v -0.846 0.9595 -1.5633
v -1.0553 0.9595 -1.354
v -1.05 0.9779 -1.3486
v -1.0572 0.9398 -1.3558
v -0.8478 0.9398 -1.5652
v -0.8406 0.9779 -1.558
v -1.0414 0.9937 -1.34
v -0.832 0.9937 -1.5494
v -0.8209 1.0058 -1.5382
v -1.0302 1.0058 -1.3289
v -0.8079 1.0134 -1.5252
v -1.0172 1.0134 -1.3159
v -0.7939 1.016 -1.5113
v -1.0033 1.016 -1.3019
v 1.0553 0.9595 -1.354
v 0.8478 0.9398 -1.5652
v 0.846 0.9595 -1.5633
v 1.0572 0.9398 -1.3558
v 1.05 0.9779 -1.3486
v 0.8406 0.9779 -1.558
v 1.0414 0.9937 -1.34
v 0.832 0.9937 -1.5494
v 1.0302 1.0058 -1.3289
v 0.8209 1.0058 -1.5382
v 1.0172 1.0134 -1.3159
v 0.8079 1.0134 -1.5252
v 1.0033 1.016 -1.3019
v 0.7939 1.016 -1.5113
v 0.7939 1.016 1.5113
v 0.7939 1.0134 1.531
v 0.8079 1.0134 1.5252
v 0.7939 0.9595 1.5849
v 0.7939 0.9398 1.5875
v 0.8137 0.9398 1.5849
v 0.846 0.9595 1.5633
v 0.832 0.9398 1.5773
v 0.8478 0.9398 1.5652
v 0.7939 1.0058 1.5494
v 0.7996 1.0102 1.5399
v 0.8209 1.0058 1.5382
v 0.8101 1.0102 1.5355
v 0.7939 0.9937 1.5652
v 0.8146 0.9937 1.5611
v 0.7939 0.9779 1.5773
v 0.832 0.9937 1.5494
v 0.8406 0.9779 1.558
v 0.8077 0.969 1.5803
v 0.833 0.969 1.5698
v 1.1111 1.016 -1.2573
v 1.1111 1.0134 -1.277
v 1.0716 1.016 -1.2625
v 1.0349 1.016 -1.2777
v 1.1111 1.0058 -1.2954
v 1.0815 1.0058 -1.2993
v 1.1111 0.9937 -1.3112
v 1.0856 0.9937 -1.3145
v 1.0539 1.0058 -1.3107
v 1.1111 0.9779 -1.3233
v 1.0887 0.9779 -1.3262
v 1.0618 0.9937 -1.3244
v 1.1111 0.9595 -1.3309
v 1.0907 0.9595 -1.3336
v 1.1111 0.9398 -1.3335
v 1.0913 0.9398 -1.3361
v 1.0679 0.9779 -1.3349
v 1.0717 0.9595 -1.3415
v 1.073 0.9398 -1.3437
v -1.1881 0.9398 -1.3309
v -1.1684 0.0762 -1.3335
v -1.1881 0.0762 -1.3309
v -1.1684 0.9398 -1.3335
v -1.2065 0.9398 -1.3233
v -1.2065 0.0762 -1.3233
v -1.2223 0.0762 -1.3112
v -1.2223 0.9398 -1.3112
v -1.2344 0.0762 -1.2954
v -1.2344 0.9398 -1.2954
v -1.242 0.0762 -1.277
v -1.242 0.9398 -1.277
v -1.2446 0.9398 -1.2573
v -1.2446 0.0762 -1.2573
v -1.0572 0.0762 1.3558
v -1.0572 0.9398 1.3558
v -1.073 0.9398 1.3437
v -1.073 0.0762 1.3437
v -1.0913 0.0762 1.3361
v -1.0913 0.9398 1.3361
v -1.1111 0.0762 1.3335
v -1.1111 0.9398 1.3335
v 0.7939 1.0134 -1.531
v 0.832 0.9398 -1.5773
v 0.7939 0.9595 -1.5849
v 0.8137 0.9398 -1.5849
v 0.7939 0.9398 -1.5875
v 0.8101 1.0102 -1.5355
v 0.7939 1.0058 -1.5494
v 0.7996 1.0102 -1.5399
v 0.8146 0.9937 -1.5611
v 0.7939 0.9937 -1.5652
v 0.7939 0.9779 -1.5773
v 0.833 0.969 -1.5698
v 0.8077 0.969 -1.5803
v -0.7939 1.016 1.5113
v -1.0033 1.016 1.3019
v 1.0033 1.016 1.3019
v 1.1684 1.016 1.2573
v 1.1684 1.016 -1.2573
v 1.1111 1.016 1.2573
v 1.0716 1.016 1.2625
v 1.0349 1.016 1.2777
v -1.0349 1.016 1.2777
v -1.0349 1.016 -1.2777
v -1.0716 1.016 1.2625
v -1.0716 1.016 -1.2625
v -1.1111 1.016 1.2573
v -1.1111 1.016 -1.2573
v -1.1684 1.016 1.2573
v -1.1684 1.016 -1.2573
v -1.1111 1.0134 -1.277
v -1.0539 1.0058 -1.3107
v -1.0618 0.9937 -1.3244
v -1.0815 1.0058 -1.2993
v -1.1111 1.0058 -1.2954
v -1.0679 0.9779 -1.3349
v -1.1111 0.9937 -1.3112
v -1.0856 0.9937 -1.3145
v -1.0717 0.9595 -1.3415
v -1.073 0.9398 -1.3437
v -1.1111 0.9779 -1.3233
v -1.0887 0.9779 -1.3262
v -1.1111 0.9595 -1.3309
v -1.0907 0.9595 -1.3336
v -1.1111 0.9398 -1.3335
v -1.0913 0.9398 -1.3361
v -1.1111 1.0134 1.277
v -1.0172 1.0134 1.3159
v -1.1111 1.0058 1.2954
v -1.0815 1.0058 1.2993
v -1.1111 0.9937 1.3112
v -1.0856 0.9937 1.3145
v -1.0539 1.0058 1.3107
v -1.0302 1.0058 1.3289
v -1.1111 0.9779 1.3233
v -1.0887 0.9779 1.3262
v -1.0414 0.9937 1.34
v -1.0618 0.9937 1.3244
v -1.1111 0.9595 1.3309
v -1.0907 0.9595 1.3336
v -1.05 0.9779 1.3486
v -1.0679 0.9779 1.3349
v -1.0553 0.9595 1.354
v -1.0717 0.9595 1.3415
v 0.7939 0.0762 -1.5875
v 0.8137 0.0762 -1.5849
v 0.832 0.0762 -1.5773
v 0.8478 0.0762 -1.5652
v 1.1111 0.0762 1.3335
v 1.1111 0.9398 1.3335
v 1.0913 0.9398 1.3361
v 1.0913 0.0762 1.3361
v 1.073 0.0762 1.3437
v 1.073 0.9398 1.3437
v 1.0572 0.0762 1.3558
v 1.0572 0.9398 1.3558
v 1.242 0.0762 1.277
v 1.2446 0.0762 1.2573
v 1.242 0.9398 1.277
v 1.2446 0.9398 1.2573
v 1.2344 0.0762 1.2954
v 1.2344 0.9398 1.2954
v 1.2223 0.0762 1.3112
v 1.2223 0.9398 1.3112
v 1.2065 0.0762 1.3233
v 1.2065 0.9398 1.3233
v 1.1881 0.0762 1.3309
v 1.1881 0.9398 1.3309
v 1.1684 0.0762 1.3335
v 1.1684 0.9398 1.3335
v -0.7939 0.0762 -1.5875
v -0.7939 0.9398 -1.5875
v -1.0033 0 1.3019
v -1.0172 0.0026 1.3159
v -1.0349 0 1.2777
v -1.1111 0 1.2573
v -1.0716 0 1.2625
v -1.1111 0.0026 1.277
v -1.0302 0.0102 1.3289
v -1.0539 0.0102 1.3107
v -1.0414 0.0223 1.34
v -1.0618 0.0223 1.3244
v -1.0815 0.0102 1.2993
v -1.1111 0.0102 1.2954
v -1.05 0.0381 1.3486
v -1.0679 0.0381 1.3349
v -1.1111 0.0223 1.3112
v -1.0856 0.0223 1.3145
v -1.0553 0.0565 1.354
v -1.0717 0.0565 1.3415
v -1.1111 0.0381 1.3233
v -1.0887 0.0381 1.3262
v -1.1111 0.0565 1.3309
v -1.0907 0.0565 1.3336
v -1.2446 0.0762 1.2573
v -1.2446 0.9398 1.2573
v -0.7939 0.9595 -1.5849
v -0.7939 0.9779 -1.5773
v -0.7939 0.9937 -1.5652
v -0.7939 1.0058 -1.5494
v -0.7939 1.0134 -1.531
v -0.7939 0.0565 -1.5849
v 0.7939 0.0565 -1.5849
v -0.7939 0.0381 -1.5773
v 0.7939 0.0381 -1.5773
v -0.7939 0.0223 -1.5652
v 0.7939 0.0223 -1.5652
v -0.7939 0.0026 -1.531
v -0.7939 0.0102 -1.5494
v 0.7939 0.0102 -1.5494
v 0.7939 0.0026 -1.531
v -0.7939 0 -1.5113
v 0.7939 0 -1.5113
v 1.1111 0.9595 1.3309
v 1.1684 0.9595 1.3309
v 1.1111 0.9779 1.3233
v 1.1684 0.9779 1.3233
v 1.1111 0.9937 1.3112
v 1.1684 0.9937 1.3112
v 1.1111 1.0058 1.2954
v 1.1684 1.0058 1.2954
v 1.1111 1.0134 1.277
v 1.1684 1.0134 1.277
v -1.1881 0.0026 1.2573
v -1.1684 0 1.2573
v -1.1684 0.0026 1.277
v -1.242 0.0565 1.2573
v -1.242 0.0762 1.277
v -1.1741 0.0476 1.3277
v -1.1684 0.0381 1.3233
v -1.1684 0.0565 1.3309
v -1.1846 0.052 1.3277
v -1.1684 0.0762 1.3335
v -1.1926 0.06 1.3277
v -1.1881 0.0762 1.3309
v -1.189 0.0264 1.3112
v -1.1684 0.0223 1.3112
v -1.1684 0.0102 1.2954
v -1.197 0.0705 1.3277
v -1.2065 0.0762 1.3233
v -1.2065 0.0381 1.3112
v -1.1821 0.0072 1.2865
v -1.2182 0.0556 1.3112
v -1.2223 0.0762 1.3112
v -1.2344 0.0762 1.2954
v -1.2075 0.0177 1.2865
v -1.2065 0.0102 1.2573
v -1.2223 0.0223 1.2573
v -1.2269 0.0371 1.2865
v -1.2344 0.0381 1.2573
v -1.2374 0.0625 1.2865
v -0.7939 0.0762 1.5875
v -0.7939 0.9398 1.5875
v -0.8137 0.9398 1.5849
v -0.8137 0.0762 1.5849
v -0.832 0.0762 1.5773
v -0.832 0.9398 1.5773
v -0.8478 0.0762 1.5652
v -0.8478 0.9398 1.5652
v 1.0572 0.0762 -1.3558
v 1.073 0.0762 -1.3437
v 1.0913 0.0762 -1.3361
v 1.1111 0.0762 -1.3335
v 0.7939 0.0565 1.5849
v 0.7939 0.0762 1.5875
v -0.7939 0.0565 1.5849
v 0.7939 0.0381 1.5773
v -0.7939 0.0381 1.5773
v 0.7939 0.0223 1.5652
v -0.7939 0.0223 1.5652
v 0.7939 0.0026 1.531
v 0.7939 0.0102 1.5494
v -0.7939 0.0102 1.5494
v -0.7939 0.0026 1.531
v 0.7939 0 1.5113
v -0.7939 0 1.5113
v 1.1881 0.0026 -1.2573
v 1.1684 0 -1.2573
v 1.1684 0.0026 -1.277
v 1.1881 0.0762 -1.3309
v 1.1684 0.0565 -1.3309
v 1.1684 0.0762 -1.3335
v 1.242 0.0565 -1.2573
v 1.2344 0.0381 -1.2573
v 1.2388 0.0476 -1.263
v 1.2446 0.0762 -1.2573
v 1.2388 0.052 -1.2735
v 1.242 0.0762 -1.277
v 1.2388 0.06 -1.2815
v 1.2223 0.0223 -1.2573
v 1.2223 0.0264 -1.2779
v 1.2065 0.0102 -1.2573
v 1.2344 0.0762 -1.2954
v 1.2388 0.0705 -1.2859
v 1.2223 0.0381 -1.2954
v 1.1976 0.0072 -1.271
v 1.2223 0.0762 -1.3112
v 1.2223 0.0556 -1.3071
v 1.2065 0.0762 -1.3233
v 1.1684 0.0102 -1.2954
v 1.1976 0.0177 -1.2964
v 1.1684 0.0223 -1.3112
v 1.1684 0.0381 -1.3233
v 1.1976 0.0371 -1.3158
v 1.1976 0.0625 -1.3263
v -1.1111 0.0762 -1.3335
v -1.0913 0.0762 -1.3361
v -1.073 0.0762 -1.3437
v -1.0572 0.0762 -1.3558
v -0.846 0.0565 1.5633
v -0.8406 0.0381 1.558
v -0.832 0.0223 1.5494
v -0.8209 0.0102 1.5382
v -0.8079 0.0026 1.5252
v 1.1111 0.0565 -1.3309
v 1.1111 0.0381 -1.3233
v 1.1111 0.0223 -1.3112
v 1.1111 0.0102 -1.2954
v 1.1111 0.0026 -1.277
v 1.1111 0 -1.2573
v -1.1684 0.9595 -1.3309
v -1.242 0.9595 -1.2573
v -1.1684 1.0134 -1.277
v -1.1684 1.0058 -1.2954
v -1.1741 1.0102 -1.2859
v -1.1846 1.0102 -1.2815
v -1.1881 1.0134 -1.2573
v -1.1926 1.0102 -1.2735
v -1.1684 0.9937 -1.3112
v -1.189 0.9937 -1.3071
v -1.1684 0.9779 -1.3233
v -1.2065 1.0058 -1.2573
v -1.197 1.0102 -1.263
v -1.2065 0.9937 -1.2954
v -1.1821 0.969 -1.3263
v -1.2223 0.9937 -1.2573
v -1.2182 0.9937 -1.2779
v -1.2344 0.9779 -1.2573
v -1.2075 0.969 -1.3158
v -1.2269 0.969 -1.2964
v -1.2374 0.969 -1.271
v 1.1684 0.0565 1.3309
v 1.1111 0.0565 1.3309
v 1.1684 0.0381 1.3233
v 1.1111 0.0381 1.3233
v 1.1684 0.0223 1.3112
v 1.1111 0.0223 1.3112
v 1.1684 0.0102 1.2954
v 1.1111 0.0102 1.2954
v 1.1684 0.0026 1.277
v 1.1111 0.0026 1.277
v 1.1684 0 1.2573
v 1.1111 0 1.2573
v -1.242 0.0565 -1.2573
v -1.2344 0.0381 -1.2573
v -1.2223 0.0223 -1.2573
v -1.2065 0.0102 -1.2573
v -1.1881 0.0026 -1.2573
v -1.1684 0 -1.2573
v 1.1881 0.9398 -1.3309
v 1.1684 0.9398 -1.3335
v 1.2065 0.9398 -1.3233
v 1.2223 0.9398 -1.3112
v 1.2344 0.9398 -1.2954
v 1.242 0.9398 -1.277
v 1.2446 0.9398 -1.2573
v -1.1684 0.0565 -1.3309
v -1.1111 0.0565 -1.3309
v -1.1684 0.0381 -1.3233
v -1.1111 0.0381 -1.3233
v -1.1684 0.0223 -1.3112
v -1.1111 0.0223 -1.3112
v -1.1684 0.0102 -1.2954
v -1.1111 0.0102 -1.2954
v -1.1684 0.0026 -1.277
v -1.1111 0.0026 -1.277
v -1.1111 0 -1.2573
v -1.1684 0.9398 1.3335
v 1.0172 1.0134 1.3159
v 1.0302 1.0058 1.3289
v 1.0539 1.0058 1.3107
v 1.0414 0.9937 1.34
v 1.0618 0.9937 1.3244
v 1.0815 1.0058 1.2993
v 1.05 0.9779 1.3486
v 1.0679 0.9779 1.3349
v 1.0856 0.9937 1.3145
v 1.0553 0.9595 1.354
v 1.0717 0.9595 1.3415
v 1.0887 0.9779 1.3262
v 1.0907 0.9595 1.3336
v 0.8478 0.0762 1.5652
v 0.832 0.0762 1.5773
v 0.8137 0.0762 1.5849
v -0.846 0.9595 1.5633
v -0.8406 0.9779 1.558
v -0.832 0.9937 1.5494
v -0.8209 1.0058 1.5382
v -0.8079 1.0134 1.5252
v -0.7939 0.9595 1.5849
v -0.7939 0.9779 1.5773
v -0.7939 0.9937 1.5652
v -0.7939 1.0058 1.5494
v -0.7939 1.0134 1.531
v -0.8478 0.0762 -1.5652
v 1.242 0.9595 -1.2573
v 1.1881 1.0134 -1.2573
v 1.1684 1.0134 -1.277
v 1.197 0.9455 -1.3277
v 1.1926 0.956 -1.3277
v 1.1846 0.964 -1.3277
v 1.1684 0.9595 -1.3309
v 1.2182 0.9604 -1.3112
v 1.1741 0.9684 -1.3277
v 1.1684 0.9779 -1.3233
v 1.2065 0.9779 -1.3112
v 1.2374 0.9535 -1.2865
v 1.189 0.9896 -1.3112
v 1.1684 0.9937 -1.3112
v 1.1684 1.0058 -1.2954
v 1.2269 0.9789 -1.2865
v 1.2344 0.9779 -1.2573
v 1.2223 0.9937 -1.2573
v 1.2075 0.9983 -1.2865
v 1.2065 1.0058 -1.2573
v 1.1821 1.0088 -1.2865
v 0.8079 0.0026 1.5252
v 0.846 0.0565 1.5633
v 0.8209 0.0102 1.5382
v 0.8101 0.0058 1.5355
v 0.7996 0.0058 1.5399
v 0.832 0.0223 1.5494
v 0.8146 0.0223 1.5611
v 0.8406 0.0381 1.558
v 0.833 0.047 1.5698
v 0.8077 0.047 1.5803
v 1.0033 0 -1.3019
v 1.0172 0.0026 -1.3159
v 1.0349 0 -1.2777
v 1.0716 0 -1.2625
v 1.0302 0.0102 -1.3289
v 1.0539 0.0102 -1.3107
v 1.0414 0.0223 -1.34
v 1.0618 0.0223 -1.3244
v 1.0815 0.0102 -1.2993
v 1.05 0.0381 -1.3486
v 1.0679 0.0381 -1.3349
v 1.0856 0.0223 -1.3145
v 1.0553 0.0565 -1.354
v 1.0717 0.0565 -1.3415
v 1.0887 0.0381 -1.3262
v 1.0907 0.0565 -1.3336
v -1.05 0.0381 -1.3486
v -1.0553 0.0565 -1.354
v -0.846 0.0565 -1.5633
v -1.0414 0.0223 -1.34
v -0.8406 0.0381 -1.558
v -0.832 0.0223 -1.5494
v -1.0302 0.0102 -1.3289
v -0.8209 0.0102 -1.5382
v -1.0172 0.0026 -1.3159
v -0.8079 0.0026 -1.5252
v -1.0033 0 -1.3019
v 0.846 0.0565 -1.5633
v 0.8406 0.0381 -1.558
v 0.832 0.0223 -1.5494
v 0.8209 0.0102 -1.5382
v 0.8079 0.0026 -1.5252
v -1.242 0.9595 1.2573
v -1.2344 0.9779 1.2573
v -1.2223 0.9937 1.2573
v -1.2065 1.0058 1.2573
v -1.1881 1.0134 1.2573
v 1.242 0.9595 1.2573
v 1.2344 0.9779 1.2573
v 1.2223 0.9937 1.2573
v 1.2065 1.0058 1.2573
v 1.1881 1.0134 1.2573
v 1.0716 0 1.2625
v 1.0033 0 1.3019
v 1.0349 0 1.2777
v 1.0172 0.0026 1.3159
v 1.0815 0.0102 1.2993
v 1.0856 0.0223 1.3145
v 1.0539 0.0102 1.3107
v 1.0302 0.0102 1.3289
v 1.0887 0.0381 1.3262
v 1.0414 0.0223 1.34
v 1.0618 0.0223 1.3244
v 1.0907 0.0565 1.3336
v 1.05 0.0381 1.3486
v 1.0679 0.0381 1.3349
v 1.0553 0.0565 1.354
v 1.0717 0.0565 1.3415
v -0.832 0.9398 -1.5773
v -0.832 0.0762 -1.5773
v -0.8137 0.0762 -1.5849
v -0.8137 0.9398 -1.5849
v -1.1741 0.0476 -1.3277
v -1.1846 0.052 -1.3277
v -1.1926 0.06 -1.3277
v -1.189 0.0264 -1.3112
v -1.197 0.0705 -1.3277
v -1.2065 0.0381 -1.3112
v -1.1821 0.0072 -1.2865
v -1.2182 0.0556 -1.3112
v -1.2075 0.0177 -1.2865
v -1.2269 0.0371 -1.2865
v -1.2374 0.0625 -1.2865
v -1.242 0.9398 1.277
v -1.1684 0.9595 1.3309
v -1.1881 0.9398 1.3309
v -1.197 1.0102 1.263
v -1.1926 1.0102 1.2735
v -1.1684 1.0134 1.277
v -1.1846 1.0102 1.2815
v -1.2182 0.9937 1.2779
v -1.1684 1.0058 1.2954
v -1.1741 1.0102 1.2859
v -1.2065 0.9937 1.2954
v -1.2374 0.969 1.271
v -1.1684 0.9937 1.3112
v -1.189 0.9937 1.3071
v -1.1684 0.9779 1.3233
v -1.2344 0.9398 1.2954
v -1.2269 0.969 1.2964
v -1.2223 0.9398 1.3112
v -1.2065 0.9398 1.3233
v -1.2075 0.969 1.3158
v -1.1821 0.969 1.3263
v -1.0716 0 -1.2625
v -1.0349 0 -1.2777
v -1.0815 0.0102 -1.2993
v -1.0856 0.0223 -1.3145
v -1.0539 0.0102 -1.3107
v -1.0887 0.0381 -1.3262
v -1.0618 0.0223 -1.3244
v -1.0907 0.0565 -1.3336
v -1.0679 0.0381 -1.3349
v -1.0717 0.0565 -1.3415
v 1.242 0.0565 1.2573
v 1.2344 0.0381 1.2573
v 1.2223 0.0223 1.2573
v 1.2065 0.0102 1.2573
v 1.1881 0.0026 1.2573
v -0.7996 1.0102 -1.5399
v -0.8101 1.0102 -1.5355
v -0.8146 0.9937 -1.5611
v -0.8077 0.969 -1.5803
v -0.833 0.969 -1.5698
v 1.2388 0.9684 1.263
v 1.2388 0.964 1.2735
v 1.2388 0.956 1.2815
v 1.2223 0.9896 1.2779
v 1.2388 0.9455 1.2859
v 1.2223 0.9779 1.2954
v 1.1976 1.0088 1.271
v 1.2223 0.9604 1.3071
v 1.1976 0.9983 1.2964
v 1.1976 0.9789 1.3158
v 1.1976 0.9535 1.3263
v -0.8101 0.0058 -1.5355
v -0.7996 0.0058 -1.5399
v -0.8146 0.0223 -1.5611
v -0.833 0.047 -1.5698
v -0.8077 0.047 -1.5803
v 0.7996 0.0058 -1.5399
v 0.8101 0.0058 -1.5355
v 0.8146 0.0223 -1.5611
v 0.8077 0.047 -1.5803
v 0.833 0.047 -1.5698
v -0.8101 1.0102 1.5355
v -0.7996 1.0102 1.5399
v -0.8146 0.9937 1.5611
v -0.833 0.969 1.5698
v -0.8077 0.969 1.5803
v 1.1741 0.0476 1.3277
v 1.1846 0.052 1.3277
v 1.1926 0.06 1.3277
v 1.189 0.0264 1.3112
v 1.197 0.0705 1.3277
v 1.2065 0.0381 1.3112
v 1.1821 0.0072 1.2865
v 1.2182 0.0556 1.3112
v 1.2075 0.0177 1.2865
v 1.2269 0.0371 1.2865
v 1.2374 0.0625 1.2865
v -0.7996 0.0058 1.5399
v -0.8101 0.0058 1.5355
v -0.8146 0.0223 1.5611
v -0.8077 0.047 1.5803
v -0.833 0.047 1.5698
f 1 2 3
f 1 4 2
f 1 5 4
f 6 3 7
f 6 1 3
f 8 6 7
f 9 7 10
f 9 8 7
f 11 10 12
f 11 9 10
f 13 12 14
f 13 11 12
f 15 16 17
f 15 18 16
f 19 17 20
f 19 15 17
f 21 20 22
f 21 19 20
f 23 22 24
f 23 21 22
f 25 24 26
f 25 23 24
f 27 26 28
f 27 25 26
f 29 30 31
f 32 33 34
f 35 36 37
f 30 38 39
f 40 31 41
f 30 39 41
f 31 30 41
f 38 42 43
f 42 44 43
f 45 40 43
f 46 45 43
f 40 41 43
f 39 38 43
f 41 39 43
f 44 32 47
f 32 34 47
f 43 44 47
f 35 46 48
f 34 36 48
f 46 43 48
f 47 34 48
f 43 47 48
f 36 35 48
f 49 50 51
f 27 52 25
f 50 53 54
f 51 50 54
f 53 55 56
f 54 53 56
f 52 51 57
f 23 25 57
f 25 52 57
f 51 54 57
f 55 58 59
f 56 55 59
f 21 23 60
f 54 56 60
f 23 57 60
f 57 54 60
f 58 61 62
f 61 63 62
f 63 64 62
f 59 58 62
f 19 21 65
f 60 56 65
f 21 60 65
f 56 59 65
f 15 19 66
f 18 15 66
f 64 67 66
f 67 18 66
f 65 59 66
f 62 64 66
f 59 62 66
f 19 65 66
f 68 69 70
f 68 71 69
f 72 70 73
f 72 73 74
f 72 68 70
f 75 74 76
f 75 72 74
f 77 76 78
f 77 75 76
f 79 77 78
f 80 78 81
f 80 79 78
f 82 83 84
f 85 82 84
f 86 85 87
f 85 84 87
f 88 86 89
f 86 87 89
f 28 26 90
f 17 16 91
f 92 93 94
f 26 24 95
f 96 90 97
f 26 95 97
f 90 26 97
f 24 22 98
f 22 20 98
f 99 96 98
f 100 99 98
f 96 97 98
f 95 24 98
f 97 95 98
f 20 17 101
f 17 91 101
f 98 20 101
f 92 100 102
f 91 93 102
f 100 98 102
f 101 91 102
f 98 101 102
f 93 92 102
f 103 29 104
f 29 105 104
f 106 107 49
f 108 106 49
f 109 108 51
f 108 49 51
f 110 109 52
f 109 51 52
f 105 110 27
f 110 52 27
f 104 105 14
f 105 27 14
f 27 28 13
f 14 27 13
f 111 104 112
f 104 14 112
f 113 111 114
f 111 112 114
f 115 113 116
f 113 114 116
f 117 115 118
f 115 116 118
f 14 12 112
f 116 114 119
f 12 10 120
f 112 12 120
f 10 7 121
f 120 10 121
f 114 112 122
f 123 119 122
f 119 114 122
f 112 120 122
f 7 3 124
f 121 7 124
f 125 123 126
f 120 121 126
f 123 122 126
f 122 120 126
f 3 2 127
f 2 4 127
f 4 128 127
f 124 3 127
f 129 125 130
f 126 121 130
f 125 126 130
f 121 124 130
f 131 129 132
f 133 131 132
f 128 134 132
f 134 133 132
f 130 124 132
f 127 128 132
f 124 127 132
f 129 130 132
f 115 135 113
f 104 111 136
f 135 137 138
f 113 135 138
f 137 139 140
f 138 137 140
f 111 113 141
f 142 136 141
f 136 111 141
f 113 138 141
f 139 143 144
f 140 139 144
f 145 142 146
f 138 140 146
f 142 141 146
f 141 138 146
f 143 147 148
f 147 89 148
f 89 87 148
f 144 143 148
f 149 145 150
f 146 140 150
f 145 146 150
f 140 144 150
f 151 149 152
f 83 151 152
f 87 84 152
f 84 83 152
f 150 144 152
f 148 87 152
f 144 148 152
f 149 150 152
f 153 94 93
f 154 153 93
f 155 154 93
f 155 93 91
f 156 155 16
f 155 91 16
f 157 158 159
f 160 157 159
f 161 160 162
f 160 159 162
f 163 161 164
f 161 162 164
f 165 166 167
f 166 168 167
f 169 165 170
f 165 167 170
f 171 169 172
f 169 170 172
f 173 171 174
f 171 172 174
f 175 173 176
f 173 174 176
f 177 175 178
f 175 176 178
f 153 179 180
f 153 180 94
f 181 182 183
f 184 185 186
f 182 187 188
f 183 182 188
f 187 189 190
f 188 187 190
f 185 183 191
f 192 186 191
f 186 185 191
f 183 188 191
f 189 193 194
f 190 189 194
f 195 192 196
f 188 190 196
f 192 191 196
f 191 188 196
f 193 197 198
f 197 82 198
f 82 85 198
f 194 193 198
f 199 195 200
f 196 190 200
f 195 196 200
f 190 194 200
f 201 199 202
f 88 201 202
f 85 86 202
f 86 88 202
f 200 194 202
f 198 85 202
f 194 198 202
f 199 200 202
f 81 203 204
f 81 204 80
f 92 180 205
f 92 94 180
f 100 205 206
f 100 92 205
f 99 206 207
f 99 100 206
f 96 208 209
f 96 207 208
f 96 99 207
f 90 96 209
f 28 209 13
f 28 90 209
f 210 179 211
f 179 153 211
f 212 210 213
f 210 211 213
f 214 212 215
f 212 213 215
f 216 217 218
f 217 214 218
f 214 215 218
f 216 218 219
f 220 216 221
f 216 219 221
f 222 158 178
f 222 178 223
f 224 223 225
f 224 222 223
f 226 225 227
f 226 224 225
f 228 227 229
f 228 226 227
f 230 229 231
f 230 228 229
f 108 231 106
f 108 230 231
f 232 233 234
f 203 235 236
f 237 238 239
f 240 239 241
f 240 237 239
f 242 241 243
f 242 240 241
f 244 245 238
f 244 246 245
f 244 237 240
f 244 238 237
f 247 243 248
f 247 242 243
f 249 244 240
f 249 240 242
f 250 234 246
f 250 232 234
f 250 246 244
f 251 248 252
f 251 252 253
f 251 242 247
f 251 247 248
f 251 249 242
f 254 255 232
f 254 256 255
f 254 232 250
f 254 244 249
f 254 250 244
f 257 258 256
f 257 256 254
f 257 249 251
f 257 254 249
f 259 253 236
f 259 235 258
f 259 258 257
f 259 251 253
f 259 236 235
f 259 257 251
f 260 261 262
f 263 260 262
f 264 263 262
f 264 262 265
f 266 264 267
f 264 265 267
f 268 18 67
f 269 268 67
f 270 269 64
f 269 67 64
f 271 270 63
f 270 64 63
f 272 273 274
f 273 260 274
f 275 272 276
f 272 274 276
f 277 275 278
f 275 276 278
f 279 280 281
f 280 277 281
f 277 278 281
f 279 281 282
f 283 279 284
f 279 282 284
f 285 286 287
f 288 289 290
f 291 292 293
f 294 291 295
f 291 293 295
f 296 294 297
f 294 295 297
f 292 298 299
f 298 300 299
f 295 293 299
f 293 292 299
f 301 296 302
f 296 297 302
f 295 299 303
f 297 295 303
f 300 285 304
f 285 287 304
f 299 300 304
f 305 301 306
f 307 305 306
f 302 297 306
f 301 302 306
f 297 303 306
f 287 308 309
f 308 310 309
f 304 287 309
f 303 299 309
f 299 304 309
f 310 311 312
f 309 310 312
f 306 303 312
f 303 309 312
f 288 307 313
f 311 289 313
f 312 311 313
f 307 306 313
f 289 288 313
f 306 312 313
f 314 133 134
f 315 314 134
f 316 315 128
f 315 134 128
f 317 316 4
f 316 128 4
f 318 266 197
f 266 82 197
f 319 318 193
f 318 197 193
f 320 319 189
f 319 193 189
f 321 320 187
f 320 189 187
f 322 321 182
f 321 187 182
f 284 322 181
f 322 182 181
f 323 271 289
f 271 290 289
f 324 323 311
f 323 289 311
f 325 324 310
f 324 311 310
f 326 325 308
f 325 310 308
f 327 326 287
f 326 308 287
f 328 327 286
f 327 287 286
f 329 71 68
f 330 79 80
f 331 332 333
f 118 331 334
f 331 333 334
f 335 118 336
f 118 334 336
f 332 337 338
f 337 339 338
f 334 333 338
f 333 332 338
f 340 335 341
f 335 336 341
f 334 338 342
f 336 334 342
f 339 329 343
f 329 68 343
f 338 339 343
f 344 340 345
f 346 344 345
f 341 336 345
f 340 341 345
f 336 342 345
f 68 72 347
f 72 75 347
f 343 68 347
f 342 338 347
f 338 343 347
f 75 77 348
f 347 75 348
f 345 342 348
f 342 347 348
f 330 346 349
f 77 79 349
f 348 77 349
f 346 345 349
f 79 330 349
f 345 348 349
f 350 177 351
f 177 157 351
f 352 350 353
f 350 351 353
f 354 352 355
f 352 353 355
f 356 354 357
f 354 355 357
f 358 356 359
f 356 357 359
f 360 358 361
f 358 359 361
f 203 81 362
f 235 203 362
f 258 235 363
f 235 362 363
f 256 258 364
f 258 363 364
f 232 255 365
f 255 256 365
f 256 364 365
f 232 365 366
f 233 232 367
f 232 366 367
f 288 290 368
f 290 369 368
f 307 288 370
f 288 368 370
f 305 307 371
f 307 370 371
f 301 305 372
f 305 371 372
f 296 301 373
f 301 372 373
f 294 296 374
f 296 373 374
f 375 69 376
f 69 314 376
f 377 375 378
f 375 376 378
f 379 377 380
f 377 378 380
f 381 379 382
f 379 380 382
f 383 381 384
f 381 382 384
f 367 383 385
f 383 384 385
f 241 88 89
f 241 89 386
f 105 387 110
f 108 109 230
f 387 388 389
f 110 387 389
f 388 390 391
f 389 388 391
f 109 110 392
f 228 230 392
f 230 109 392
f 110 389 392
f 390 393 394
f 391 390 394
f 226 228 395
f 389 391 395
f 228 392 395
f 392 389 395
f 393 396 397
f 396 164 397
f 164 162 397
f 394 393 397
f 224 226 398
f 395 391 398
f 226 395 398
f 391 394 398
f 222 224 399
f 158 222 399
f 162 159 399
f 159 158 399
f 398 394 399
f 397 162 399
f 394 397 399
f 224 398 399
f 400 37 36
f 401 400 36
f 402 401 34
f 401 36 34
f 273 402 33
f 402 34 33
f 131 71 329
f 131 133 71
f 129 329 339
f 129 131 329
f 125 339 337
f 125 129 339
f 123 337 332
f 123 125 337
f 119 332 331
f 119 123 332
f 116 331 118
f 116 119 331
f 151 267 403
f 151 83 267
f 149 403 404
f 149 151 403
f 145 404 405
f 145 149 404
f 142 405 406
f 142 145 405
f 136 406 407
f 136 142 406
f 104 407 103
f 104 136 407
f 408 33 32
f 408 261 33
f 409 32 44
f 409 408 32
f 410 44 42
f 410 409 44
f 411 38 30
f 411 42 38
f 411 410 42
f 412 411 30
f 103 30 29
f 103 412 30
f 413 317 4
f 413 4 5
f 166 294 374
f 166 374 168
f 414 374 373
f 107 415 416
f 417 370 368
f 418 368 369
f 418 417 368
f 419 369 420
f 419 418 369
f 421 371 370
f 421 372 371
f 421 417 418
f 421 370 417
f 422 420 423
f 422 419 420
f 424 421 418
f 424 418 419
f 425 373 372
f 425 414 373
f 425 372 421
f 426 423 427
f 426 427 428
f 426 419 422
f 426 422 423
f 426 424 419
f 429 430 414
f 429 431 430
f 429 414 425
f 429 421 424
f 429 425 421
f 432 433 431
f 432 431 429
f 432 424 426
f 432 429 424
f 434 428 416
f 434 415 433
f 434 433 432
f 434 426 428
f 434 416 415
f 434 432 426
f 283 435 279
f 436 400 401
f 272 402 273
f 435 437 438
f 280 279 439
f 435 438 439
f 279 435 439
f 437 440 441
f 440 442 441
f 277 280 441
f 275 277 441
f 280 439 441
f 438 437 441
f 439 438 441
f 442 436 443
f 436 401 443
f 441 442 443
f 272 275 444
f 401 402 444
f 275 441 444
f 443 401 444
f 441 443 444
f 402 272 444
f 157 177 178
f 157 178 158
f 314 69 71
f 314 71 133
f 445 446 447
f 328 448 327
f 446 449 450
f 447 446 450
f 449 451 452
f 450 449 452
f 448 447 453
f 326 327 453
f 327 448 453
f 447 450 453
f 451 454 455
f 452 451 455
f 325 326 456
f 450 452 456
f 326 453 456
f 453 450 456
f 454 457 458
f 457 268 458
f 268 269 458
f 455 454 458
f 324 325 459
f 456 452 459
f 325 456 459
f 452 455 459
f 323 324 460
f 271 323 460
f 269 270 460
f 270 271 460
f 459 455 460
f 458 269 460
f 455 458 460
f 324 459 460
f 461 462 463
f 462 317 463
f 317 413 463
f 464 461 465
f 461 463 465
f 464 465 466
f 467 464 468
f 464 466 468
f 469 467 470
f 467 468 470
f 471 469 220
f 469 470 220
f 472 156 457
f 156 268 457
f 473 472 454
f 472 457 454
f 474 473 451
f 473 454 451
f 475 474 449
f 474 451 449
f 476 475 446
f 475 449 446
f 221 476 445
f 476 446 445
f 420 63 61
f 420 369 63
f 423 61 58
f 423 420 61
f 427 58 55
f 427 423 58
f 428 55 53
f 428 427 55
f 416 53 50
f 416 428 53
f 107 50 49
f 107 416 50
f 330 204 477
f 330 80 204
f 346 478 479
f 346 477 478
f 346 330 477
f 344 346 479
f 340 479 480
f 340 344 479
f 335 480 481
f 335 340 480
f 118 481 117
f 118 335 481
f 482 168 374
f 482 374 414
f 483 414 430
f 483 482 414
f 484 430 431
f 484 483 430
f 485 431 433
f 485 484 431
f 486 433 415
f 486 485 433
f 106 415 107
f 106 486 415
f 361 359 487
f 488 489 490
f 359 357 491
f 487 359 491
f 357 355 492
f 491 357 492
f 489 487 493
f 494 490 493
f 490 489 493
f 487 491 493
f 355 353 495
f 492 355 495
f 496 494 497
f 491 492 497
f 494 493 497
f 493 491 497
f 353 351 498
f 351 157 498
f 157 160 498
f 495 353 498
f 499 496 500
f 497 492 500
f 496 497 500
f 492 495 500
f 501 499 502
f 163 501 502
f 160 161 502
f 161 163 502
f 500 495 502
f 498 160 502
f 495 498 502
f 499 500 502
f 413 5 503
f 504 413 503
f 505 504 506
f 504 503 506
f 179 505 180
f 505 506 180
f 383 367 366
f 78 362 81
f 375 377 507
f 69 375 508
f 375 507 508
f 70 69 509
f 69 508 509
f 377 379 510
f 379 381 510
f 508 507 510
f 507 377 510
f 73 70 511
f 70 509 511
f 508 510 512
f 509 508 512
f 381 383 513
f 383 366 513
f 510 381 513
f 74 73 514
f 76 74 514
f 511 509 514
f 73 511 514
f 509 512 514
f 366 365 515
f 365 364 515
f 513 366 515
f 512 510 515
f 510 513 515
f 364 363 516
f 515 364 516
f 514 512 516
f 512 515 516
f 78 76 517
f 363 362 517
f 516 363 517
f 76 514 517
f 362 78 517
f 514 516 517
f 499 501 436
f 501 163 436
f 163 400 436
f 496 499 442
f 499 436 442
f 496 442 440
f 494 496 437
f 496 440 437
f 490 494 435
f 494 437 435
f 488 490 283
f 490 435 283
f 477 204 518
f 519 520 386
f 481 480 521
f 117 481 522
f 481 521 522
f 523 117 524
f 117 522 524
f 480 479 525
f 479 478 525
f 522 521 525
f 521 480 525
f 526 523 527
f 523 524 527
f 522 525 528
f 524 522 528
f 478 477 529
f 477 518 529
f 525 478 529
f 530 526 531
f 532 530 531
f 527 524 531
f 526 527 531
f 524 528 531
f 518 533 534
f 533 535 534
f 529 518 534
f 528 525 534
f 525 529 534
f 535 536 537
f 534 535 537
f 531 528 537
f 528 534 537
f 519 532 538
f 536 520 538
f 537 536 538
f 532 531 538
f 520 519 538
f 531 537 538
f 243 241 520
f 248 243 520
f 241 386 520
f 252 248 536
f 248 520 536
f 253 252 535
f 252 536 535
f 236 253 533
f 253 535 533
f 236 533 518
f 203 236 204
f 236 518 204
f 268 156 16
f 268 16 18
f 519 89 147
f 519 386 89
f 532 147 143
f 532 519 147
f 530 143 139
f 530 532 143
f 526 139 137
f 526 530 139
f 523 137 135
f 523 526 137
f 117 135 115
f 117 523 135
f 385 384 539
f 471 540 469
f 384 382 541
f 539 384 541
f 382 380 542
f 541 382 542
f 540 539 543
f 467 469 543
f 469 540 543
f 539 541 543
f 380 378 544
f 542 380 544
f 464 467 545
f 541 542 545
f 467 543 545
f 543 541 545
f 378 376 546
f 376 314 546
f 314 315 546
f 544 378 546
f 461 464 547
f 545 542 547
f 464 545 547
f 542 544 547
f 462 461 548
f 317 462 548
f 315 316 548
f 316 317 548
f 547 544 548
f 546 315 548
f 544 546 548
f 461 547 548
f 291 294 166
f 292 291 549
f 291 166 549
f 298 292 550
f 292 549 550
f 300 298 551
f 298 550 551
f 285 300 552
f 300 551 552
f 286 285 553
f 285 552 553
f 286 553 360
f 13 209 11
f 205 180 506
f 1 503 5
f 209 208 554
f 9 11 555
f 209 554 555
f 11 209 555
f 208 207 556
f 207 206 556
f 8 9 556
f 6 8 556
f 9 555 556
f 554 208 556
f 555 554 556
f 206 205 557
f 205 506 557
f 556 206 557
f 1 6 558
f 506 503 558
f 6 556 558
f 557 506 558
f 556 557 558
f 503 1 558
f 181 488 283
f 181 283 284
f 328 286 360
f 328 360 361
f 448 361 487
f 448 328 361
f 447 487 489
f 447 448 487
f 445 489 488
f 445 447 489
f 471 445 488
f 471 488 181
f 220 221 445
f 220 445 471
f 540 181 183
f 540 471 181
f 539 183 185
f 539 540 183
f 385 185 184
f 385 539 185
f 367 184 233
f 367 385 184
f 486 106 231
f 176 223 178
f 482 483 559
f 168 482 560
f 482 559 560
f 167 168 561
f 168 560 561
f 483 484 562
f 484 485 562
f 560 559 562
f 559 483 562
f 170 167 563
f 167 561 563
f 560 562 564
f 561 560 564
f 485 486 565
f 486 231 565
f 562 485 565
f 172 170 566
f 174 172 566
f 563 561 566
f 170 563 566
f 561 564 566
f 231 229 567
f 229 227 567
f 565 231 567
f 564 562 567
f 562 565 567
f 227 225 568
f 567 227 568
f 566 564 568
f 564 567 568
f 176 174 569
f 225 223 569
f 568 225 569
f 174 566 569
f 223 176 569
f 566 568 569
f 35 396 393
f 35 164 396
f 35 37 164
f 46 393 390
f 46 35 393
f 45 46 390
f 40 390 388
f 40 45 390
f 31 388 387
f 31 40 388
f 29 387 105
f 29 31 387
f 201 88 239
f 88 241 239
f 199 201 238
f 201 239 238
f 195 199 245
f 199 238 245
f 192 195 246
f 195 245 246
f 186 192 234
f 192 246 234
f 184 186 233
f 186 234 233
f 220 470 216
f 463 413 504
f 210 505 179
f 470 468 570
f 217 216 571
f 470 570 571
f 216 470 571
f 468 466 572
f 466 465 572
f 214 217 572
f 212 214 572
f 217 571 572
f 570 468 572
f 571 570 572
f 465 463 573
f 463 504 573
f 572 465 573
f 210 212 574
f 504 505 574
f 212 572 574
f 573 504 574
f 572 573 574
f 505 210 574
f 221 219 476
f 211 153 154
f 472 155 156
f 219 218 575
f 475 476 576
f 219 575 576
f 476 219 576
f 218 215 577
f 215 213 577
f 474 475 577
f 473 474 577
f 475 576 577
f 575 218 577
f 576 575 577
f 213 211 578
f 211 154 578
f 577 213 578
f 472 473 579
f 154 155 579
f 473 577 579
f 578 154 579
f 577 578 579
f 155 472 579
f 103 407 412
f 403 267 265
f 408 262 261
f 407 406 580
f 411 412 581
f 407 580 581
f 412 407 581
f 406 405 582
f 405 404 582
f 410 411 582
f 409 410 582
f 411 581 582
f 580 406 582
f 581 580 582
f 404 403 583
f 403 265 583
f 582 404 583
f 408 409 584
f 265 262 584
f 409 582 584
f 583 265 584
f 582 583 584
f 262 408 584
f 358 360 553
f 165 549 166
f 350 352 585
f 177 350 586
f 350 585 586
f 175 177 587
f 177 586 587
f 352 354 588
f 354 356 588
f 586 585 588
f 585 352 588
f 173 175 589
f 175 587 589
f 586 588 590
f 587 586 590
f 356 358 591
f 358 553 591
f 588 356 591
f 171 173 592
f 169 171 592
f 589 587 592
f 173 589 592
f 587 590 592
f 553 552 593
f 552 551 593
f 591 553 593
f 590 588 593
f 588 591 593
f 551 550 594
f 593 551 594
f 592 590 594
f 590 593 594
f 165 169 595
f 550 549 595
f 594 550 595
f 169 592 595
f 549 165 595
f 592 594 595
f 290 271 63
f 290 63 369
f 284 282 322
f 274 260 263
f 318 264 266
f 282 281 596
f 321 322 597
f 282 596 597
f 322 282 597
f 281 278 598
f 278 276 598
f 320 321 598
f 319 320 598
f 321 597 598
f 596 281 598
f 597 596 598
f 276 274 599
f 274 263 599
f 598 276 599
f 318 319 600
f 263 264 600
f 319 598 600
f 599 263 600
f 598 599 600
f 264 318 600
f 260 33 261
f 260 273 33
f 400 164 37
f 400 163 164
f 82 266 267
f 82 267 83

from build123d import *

# Parameters (mm, degrees)
BOSS_EXTRUDE1_DEPTH = 1.016
FILLET1_R           = 0.0762


with BuildPart() as part:
    # Sketch1 → Boss-Extrude1 (new body)
    with BuildSketch(Plane(origin=(0, 0, 0), x_dir=(1, 0, 0), z_dir=(0, 1, 0))):
        Polygon((-1.2446, 1.3335), (-1.0795, 1.3335), (-0.8255, 1.5875), (0.8255, 1.5875), (1.0795, 1.3335), (1.2446, 1.3335), (1.2446, -1.3335), (1.0795, -1.3335), (0.8255, -1.5875), (-0.8255, -1.5875), (-1.0795, -1.3335), (-1.2446, -1.3335), align=None)
    extrude(amount=BOSS_EXTRUDE1_DEPTH)

    # Fillet1
    fillet1_edges = [part.edges().sort_by_distance(p)[0] for p in [
        (0, 1.016, 1.5875),
        (-1.2446, 0, 0),
        (-1.16205, 0, -1.3335),
        (-0.9525, 0, -1.4605),
        (0, 0, -1.5875),
        (0.9525, 0, -1.4605),
        (1.16205, 0, -1.3335),
        (0.9525, 1.016, 1.4605),
        (1.2446, 0, 0),
        (1.16205, 0, 1.3335),
        (0.9525, 0, 1.4605),
        (0, 0, 1.5875),
        (-0.9525, 0, 1.4605),
        (-1.16205, 0, 1.3335),
        (1.16205, 1.016, 1.3335),
        (1.2446, 1.016, 0),
        (-1.2446, 0.508, 1.3335),
        (-1.2446, 0.508, -1.3335),
        (-1.0795, 0.508, -1.3335),
        (-0.8255, 0.508, -1.5875),
        (0.8255, 0.508, -1.5875),
        (1.0795, 0.508, -1.3335),
        (1.2446, 0.508, -1.3335),
        (1.2446, 0.508, 1.3335),
        (1.0795, 0.508, 1.3335),
        (0.8255, 0.508, 1.5875),
        (-0.8255, 0.508, 1.5875),
        (-1.0795, 0.508, 1.3335),
        (1.16205, 1.016, -1.3335),
        (0.9525, 1.016, -1.4605),
        (0, 1.016, -1.5875),
        (-0.9525, 1.016, -1.4605),
        (-1.16205, 1.016, -1.3335),
        (-1.2446, 1.016, 0),
        (-1.16205, 1.016, 1.3335),
        (-0.9525, 1.016, 1.4605),
    ]]
    fillet(fillet1_edges, radius=FILLET1_R)


solid = part.part
